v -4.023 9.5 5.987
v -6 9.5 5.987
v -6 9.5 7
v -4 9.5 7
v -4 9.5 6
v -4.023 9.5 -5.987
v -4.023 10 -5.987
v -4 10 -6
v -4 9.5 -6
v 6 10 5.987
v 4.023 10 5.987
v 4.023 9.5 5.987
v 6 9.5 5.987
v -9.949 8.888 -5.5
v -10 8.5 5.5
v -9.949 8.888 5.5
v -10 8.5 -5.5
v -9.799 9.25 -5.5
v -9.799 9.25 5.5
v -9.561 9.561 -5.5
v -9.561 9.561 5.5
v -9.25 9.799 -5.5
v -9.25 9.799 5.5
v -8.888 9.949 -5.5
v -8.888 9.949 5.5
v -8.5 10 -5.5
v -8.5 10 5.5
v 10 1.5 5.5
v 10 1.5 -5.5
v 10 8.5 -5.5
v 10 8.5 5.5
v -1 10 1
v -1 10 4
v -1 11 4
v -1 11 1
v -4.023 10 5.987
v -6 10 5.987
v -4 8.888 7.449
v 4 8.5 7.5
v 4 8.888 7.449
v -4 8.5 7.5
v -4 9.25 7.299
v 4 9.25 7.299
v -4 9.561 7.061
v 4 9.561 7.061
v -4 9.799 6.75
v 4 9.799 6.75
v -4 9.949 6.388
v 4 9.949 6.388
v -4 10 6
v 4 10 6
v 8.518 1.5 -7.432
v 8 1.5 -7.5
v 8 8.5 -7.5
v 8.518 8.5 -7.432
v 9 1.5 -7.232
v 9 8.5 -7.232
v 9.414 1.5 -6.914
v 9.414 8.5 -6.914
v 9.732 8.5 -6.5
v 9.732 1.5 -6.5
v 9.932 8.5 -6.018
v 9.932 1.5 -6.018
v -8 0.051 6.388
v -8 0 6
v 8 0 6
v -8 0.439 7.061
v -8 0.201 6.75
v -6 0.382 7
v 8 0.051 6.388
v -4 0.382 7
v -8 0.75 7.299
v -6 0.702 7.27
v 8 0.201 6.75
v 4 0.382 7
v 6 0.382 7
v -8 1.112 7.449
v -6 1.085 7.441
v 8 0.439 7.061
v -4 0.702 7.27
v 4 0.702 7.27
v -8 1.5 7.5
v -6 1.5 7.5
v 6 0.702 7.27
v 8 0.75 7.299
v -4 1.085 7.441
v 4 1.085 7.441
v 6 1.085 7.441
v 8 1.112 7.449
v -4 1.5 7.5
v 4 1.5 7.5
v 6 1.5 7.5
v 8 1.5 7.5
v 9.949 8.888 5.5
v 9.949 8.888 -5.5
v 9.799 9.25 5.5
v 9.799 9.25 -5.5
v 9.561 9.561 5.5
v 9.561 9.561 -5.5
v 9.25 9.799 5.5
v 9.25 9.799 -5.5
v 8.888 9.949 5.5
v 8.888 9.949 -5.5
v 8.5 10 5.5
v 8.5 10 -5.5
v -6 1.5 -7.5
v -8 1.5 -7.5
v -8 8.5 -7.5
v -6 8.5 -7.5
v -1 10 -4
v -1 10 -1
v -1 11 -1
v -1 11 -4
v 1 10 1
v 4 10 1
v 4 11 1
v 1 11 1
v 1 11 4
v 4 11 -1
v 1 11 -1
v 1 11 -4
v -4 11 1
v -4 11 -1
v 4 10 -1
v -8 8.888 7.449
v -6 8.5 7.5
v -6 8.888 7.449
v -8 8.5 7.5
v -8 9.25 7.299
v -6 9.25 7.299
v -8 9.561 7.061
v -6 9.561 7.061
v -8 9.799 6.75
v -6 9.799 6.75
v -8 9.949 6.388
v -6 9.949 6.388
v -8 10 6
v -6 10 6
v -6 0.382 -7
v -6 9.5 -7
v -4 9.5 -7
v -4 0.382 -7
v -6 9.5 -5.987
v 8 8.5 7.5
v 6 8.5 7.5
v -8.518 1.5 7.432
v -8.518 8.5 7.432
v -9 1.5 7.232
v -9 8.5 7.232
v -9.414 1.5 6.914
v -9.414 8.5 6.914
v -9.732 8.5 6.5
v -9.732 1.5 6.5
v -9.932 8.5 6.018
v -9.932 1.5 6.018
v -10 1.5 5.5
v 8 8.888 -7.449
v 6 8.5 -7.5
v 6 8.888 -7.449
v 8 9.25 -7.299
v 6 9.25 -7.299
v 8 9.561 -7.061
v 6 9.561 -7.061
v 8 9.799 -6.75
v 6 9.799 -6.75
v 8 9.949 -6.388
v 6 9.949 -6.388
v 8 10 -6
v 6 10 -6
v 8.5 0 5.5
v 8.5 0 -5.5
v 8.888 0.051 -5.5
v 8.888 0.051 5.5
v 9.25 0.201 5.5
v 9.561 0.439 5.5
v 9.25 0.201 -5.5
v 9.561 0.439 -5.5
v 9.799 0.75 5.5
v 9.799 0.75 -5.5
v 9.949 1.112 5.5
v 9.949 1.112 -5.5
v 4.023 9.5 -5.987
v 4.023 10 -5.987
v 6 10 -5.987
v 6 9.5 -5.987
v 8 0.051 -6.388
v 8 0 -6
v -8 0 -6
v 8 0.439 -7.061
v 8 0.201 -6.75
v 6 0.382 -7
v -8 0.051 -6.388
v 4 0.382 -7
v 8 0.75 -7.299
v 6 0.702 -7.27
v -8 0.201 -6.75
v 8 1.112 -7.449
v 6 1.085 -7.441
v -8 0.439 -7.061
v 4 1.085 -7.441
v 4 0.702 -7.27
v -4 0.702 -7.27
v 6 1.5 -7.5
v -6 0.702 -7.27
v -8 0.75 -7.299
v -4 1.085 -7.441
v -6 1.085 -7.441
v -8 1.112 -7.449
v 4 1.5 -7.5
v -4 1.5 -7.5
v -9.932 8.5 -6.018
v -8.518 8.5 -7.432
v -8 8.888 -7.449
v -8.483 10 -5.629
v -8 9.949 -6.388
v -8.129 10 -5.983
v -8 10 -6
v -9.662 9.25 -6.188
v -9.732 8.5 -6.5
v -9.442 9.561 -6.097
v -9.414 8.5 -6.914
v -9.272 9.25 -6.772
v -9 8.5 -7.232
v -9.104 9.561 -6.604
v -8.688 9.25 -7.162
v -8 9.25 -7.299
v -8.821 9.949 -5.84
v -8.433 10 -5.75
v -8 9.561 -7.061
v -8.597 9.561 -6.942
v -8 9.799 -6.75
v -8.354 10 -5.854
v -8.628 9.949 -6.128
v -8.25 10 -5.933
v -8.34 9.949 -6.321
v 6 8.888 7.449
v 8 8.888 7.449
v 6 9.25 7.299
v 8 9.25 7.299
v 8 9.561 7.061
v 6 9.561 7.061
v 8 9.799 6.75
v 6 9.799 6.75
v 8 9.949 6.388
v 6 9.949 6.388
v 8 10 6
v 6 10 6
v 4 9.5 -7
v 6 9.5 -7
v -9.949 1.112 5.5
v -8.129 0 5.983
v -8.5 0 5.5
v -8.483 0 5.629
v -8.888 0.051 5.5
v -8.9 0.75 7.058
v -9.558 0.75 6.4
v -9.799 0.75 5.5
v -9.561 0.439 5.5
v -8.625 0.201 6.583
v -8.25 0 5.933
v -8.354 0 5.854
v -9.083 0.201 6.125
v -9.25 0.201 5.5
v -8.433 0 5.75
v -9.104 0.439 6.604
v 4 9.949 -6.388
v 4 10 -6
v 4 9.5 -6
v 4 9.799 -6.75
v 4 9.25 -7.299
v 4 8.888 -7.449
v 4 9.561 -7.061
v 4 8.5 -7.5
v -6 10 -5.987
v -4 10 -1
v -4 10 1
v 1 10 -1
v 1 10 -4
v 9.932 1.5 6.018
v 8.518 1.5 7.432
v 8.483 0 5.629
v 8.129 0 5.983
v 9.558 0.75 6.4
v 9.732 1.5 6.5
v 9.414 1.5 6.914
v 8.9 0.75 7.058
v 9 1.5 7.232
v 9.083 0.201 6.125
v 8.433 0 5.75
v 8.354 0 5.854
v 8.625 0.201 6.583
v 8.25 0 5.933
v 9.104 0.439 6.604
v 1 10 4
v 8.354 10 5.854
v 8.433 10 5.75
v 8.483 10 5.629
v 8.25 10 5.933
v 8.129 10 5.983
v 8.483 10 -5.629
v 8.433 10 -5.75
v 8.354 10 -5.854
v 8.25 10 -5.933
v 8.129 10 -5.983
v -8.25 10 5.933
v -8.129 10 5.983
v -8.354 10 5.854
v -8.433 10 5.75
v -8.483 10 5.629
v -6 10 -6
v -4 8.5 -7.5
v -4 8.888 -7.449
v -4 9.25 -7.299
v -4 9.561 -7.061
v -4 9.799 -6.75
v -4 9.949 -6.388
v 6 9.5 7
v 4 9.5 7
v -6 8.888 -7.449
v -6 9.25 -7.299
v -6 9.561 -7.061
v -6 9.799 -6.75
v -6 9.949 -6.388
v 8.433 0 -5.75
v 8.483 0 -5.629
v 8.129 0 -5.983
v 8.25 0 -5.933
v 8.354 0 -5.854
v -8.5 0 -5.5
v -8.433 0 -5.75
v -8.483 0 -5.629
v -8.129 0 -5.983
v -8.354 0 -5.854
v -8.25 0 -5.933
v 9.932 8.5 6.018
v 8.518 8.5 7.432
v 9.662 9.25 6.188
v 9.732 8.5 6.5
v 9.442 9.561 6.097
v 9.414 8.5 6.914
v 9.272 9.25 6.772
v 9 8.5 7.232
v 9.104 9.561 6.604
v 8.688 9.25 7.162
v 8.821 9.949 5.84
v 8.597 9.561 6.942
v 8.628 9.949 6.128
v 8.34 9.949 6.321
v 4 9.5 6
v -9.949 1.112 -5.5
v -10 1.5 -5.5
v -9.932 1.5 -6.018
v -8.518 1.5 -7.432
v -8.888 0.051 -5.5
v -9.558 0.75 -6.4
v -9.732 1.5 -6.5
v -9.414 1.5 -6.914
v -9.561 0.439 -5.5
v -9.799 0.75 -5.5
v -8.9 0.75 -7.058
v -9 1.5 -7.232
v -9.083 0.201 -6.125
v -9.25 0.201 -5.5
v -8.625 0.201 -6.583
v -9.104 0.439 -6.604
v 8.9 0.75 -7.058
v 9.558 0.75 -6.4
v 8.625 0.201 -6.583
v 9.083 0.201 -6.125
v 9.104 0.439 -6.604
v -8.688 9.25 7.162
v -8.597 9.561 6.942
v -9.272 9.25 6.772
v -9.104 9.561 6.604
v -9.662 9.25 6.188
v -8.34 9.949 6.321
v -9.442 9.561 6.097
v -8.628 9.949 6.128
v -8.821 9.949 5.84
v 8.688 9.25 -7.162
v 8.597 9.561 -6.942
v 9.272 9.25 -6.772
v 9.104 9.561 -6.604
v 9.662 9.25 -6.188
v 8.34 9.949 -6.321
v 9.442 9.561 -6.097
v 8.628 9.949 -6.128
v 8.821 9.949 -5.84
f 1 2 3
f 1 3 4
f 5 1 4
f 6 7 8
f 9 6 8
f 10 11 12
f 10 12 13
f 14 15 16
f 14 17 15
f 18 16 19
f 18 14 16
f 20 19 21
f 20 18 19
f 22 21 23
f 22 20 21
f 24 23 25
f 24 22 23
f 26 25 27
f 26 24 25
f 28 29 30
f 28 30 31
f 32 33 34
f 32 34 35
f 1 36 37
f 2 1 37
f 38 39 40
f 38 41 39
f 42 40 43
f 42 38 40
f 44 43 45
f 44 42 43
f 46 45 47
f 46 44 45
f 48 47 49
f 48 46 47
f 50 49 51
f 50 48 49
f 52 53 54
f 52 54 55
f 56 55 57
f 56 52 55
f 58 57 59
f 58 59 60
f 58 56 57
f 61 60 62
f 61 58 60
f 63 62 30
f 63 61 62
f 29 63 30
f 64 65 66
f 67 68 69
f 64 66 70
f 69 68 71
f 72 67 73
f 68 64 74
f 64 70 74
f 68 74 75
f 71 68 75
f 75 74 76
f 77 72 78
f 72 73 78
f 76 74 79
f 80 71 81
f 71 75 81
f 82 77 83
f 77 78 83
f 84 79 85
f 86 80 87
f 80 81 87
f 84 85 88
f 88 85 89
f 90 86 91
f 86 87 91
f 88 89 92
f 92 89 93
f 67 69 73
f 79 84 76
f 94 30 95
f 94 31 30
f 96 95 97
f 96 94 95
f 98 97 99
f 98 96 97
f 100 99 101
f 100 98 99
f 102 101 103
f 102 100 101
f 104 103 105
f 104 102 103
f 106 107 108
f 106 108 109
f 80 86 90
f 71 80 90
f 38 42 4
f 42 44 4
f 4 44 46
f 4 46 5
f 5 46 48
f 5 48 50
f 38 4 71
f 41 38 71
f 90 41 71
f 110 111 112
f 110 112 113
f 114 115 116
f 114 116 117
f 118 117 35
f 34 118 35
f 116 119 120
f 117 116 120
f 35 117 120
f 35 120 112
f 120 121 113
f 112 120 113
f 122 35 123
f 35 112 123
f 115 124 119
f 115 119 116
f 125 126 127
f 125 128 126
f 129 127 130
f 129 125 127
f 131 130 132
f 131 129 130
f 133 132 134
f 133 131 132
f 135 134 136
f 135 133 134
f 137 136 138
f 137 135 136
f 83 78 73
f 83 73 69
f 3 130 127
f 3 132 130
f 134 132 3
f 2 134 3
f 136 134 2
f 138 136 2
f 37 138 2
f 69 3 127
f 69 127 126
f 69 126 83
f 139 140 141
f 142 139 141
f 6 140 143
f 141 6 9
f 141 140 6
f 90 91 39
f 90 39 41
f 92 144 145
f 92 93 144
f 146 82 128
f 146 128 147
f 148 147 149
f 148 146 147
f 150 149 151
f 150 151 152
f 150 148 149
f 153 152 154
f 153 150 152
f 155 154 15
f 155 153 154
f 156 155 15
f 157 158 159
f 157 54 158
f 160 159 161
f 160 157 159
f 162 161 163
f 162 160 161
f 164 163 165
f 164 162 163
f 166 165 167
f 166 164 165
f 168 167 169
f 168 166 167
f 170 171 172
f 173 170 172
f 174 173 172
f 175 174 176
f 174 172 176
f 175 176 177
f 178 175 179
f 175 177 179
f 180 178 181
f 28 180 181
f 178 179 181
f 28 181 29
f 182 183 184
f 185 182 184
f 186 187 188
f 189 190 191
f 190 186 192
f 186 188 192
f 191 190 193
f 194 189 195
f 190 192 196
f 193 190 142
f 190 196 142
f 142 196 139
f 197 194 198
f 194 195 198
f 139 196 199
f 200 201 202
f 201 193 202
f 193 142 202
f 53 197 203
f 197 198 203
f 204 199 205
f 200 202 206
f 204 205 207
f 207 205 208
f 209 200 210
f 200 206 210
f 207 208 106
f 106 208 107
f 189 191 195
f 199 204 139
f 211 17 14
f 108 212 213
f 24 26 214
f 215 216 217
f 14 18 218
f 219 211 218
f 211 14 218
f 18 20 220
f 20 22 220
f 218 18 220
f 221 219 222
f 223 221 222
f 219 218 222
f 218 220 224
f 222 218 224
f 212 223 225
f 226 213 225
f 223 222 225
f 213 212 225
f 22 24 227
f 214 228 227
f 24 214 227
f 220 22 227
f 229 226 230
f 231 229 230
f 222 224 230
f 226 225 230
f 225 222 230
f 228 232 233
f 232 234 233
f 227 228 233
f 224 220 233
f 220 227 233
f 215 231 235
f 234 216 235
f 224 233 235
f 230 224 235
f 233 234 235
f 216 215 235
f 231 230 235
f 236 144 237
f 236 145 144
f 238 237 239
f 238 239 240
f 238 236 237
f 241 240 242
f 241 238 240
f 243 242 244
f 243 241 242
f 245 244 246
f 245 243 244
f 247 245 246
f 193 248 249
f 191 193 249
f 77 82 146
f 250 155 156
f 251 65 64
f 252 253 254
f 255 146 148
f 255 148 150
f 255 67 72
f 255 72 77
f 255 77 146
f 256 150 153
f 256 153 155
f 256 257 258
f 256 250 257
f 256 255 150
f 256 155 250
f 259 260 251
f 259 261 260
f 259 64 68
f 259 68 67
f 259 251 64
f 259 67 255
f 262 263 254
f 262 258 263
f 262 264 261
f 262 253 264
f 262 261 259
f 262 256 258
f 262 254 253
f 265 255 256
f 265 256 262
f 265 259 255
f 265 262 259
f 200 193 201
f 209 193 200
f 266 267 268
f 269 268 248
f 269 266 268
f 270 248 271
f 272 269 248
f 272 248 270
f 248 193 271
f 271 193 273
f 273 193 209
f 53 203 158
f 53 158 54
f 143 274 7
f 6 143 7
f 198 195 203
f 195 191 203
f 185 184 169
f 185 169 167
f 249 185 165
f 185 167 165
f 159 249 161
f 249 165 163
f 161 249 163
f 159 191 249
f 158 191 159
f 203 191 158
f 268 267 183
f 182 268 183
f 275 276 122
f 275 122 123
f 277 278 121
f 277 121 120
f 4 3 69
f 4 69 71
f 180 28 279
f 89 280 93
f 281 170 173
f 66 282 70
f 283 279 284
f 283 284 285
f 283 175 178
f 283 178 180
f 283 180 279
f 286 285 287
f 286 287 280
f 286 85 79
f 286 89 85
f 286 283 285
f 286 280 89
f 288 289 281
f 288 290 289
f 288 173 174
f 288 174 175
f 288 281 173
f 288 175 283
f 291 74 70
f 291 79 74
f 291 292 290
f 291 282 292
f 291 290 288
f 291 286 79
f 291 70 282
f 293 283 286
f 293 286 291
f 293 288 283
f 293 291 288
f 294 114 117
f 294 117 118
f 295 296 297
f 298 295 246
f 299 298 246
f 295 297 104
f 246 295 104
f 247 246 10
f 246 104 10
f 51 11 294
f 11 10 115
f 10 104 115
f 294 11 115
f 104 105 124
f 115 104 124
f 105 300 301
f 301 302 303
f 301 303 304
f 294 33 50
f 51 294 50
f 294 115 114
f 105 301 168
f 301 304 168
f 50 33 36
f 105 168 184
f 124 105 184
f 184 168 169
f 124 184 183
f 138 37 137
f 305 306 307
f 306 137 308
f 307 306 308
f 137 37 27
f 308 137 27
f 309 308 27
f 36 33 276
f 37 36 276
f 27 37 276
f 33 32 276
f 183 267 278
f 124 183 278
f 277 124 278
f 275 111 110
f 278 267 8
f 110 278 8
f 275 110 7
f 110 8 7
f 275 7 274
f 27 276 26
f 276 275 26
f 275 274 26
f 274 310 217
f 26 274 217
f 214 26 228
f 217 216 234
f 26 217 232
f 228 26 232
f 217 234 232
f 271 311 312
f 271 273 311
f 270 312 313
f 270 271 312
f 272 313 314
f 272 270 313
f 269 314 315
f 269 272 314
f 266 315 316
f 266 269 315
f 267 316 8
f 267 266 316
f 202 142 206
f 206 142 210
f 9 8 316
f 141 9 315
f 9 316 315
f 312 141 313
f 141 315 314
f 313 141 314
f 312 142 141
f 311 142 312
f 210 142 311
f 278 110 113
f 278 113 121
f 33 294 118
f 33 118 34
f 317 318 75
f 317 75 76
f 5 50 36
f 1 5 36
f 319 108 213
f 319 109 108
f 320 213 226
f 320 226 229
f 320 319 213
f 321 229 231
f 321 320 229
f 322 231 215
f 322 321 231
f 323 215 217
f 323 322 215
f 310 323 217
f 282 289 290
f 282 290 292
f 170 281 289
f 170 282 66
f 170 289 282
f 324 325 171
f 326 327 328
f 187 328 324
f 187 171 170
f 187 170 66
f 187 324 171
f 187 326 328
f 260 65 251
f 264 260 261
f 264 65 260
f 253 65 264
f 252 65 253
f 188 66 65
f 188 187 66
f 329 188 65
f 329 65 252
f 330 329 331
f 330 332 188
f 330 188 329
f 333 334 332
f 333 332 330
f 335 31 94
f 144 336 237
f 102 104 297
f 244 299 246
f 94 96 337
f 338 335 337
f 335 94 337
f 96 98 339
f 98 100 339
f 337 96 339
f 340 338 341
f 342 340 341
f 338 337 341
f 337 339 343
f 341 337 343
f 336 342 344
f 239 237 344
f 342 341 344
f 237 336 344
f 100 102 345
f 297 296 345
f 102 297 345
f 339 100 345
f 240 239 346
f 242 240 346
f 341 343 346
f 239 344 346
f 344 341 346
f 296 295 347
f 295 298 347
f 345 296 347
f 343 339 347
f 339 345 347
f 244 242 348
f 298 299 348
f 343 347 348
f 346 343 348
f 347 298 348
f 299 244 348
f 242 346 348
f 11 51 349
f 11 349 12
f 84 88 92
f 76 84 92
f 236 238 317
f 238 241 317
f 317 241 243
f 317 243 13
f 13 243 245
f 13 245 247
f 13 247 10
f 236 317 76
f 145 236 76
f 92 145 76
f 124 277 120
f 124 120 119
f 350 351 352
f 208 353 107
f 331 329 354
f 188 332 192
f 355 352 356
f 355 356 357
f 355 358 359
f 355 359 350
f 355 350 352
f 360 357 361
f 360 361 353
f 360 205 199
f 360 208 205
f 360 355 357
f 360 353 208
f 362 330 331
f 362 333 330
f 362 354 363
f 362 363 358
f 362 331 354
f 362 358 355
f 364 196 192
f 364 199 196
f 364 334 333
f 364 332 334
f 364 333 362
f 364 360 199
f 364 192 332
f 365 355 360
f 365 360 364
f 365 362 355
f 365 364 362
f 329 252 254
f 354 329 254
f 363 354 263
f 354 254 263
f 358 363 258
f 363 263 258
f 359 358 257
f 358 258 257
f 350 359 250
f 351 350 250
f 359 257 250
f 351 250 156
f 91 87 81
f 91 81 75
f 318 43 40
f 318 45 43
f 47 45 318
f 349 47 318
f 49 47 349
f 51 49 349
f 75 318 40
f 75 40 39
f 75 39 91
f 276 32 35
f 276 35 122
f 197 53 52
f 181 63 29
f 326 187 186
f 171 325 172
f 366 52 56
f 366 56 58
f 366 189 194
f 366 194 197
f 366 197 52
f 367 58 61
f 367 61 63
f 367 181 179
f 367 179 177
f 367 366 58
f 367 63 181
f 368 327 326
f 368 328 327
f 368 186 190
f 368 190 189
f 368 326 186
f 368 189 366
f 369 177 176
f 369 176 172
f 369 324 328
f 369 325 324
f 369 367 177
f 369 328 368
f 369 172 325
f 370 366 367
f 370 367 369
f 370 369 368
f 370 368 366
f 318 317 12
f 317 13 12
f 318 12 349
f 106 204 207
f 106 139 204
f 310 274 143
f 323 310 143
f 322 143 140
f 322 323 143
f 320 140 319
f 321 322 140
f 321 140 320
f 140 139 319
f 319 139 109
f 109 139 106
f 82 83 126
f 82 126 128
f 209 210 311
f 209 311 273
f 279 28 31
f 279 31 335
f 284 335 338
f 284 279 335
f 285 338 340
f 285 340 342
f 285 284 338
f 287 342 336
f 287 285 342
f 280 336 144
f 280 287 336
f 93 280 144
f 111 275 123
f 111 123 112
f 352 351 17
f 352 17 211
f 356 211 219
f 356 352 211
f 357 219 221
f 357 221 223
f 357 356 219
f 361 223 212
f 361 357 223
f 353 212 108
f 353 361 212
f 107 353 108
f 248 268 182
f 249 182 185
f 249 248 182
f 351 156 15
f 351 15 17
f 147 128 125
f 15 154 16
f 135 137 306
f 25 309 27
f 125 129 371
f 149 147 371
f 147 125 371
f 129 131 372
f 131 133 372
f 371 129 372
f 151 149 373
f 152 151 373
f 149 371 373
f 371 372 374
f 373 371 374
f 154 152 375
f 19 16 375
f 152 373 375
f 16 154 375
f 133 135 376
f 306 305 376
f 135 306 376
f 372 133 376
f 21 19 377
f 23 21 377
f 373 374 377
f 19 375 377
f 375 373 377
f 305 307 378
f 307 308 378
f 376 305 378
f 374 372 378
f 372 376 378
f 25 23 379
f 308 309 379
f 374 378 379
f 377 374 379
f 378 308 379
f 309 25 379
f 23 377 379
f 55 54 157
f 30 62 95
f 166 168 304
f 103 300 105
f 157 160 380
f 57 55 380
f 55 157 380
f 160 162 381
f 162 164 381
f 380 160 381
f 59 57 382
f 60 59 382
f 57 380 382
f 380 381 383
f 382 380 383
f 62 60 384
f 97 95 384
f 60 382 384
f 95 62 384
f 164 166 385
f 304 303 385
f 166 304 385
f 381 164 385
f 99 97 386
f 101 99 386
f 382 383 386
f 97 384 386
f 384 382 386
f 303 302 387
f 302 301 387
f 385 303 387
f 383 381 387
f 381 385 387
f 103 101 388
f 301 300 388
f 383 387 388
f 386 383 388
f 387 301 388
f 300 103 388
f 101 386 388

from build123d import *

# Parameters (mm, degrees)
BOSS_EXTRUDE1_DEPTH = 10
SKETCH2_W           = 2
SKETCH2_H           = 0.5
CUT_EXTRUDE1_DEPTH  = 10
CUT_EXTRUDE2_DEPTH  = 0.5
FILLET1_R           = 1.5
FILLET2_R           = 1.5
BOSS_EXTRUDE2_DEPTH = 1


with BuildPart() as part:
    # Sketch1 → Boss-Extrude1 (new body)
    with BuildSketch(Plane(origin=(0, 0, 0), x_dir=(1, 0, 0), z_dir=(0, 1, 0))):
        with BuildLine():
            Line((-8, 7.5), (8, 7.5))
            ThreePointArc((8, 7.5), (9.414213562, 6.914213562), (10, 5.5))
            Line((10, 5.5), (10, -5.5))
            ThreePointArc((10, -5.5), (9.414213562, -6.914213562), (8, -7.5))
            Line((8, -7.5), (-8, -7.5))
            ThreePointArc((-8, -7.5), (-9.414213562, -6.914213562), (-10, -5.5))
            Line((-10, -5.5), (-10, 5.5))
            ThreePointArc((-10, 5.5), (-9.414213562, 6.914213562), (-8, 7.5))
        make_face()
    extrude(amount=BOSS_EXTRUDE1_DEPTH)

    # Sketch2 → Cut-Extrude1 (cut)
    with BuildSketch(Plane(origin=(0, 10, 0), x_dir=(1, 0, 0), z_dir=(0, 1, 0))):
        with Locations((-5, 7.25)):
            Rectangle(SKETCH2_W, SKETCH2_H)
        with Locations((5, 7.25)):
            Rectangle(SKETCH2_W, SKETCH2_H)
        with Locations((5, -7.25)):
            Rectangle(SKETCH2_W, SKETCH2_H)
        with Locations((-5, -7.25)):
            Rectangle(SKETCH2_W, SKETCH2_H)
    extrude(amount=-CUT_EXTRUDE1_DEPTH, mode=Mode.SUBTRACT)

    # Sketch3 → Cut-Extrude2 (cut)
    with BuildSketch(Plane(origin=(0, 10, 0), x_dir=(1, 0, 0), z_dir=(0, 1, 0))):
        Polygon((-6, 7), (-6, 5.986822399), (-4.02260562, 5.986822399), (-4, 6), (-4, 7), align=None)
        Polygon((4, 7), (4, 6), (4.02260562, 5.986822399), (6, 5.986822399), (6, 7), align=None)
        Polygon((6, -7), (4, -7), (4, -6), (4.02260562, -5.986822399), (6, -5.986822399), align=None)
        Polygon((-4, -7), (-4, -6), (-4.02260562, -5.986822399), (-6, -5.986822399), (-6, -7), align=None)
    extrude(amount=-CUT_EXTRUDE2_DEPTH, mode=Mode.SUBTRACT)

    # Fillet1
    fillet1_edges = [part.edges().sort_by_distance(p)[0] for p in [
        (-9.414213562, 10, 6.914213562),
        (-10, 10, 0),
        (-9.414213562, 10, -6.914213562),
        (7, 10, -7.5),
        (-7, 10, -7.5),
        (9.414213562, 10, -6.914213562),
        (10, 10, 0),
        (9.414213562, 10, 6.914213562),
        (7, 10, 7.5),
        (-7, 10, 7.5),
        (0, 10, 7.5),
        (0, 10, -7.5),
    ]]
    fillet(fillet1_edges, radius=FILLET1_R)

    # Fillet2
    # the kernel refuses this fillet: 1.5 mm, written as the material it takes off along each edge
    with BuildSketch(Plane(origin=(2.25, 0, -7.5), x_dir=(0, 0, 1), z_dir=(1, 0, 0)), Plane(origin=(8, 0, 7.5), x_dir=(0, 0, -1), z_dir=(-1, 0, 0)), Plane(origin=(-2.25, 0, 7.5), x_dir=(0, 0, -1), z_dir=(-1, 0, 0))) as fillet2_piece_1:
        with BuildLine():
            CenterArc((FILLET2_R, -FILLET2_R), FILLET2_R, 90, 90)
            Line((0, -FILLET2_R), (0, 0))
            Line((0, 0), (FILLET2_R, 0))
        make_face()
    extrude(amount=5.75, mode=Mode.SUBTRACT)
    with BuildSketch(Plane(origin=(8, 0, -5.5), x_dir=(0, 0, -1), z_dir=(-1, 0, 0))) as fillet2_piece_2:
        with BuildLine():
            CenterArc((2 - FILLET2_R, -FILLET2_R), FILLET2_R, 0, 90)
            Line((2, -FILLET2_R), (2, 0))
            Line((2, 0), (2 - FILLET2_R, 0))
        make_face()
    revolve(axis=Axis((8, 0, -5.5), (0, -1, 0)), revolution_arc=90, mode=Mode.SUBTRACT)
    with BuildSketch(Plane(origin=(10, 0, -5.5), x_dir=(-1, 0, 0), z_dir=(0, 0, 1)), Plane(origin=(-10, 0, 5.5), x_dir=(1, 0, 0), z_dir=(0, 0, -1))) as fillet2_piece_3:
        with BuildLine():
            CenterArc((FILLET2_R, -FILLET2_R), FILLET2_R, 90, 90)
            Line((0, -FILLET2_R), (0, 0))
            Line((0, 0), (FILLET2_R, 0))
        make_face()
    extrude(amount=11, mode=Mode.SUBTRACT)
    with BuildSketch(Plane(origin=(8, 0, 5.5), x_dir=(1, 0, 0), z_dir=(0, 0, -1))) as fillet2_piece_4:
        with BuildLine():
            CenterArc((2 - FILLET2_R, -FILLET2_R), FILLET2_R, 0, 90)
            Line((2, -FILLET2_R), (2, 0))
            Line((2, 0), (2 - FILLET2_R, 0))
        make_face()
    revolve(axis=Axis((8, 0, 5.5), (0, -1, 0)), revolution_arc=90, mode=Mode.SUBTRACT)
    with BuildSketch(Plane(origin=(7.75, 0, 7.5), x_dir=(0, 0, -1), z_dir=(-1, 0, 0)), Plane(origin=(-7.75, 0, -7.5), x_dir=(0, 0, 1), z_dir=(1, 0, 0))) as fillet2_piece_5:
        with BuildLine():
            CenterArc((FILLET2_R, -FILLET2_R), FILLET2_R, 90, 90)
            Line((0, -FILLET2_R), (0, 0))
            Line((0, 0), (FILLET2_R, 0))
        make_face()
    extrude(amount=15.5, mode=Mode.SUBTRACT)
    with BuildSketch(Plane(origin=(-8, 0, -7.5), x_dir=(0, 1, 0), z_dir=(1, 0, 0))) as fillet2_piece_6:
        with BuildLine():
            CenterArc((FILLET2_R, FILLET2_R), FILLET2_R, 180, 90)
            Line((0, FILLET2_R), (0, 0))
            Line((0, 0), (FILLET2_R, 0))
        make_face()
    extrude(amount=5.75, mode=Mode.SUBTRACT)
    with BuildSketch(Plane(origin=(-8, 0, 5.5), x_dir=(0, 0, 1), z_dir=(1, 0, 0))) as fillet2_piece_7:
        with BuildLine():
            CenterArc((2 - FILLET2_R, -FILLET2_R), FILLET2_R, 0, 90)
            Line((2, -FILLET2_R), (2, 0))
            Line((2, 0), (2 - FILLET2_R, 0))
        make_face()
    revolve(axis=Axis((-8, 0, 5.5), (0, -1, 0)), revolution_arc=90, mode=Mode.SUBTRACT)
    with BuildSketch(Plane(origin=(-8, 0, -5.5), x_dir=(-1, 0, 0), z_dir=(0, 0, 1))) as fillet2_piece_8:
        with BuildLine():
            CenterArc((2 - FILLET2_R, -FILLET2_R), FILLET2_R, 0, 90)
            Line((2, -FILLET2_R), (2, 0))
            Line((2, 0), (2 - FILLET2_R, 0))
        make_face()
    revolve(axis=Axis((-8, 0, -5.5), (0, -1, 0)), revolution_arc=90, mode=Mode.SUBTRACT)

    # Sketch4 → Boss-Extrude2 (add)
    with BuildSketch(Plane(origin=(0, 10, 0), x_dir=(1, 0, 0), z_dir=(0, 1, 0))):
        Polygon((-1, 4), (1, 4), (1, 1), (4, 1), (4, -1), (1, -1), (1, -4), (-1, -4), (-1, -1), (-4, -1), (-4, 1), (-1, 1), align=None)
    extrude(amount=BOSS_EXTRUDE2_DEPTH)


solid = part.part
